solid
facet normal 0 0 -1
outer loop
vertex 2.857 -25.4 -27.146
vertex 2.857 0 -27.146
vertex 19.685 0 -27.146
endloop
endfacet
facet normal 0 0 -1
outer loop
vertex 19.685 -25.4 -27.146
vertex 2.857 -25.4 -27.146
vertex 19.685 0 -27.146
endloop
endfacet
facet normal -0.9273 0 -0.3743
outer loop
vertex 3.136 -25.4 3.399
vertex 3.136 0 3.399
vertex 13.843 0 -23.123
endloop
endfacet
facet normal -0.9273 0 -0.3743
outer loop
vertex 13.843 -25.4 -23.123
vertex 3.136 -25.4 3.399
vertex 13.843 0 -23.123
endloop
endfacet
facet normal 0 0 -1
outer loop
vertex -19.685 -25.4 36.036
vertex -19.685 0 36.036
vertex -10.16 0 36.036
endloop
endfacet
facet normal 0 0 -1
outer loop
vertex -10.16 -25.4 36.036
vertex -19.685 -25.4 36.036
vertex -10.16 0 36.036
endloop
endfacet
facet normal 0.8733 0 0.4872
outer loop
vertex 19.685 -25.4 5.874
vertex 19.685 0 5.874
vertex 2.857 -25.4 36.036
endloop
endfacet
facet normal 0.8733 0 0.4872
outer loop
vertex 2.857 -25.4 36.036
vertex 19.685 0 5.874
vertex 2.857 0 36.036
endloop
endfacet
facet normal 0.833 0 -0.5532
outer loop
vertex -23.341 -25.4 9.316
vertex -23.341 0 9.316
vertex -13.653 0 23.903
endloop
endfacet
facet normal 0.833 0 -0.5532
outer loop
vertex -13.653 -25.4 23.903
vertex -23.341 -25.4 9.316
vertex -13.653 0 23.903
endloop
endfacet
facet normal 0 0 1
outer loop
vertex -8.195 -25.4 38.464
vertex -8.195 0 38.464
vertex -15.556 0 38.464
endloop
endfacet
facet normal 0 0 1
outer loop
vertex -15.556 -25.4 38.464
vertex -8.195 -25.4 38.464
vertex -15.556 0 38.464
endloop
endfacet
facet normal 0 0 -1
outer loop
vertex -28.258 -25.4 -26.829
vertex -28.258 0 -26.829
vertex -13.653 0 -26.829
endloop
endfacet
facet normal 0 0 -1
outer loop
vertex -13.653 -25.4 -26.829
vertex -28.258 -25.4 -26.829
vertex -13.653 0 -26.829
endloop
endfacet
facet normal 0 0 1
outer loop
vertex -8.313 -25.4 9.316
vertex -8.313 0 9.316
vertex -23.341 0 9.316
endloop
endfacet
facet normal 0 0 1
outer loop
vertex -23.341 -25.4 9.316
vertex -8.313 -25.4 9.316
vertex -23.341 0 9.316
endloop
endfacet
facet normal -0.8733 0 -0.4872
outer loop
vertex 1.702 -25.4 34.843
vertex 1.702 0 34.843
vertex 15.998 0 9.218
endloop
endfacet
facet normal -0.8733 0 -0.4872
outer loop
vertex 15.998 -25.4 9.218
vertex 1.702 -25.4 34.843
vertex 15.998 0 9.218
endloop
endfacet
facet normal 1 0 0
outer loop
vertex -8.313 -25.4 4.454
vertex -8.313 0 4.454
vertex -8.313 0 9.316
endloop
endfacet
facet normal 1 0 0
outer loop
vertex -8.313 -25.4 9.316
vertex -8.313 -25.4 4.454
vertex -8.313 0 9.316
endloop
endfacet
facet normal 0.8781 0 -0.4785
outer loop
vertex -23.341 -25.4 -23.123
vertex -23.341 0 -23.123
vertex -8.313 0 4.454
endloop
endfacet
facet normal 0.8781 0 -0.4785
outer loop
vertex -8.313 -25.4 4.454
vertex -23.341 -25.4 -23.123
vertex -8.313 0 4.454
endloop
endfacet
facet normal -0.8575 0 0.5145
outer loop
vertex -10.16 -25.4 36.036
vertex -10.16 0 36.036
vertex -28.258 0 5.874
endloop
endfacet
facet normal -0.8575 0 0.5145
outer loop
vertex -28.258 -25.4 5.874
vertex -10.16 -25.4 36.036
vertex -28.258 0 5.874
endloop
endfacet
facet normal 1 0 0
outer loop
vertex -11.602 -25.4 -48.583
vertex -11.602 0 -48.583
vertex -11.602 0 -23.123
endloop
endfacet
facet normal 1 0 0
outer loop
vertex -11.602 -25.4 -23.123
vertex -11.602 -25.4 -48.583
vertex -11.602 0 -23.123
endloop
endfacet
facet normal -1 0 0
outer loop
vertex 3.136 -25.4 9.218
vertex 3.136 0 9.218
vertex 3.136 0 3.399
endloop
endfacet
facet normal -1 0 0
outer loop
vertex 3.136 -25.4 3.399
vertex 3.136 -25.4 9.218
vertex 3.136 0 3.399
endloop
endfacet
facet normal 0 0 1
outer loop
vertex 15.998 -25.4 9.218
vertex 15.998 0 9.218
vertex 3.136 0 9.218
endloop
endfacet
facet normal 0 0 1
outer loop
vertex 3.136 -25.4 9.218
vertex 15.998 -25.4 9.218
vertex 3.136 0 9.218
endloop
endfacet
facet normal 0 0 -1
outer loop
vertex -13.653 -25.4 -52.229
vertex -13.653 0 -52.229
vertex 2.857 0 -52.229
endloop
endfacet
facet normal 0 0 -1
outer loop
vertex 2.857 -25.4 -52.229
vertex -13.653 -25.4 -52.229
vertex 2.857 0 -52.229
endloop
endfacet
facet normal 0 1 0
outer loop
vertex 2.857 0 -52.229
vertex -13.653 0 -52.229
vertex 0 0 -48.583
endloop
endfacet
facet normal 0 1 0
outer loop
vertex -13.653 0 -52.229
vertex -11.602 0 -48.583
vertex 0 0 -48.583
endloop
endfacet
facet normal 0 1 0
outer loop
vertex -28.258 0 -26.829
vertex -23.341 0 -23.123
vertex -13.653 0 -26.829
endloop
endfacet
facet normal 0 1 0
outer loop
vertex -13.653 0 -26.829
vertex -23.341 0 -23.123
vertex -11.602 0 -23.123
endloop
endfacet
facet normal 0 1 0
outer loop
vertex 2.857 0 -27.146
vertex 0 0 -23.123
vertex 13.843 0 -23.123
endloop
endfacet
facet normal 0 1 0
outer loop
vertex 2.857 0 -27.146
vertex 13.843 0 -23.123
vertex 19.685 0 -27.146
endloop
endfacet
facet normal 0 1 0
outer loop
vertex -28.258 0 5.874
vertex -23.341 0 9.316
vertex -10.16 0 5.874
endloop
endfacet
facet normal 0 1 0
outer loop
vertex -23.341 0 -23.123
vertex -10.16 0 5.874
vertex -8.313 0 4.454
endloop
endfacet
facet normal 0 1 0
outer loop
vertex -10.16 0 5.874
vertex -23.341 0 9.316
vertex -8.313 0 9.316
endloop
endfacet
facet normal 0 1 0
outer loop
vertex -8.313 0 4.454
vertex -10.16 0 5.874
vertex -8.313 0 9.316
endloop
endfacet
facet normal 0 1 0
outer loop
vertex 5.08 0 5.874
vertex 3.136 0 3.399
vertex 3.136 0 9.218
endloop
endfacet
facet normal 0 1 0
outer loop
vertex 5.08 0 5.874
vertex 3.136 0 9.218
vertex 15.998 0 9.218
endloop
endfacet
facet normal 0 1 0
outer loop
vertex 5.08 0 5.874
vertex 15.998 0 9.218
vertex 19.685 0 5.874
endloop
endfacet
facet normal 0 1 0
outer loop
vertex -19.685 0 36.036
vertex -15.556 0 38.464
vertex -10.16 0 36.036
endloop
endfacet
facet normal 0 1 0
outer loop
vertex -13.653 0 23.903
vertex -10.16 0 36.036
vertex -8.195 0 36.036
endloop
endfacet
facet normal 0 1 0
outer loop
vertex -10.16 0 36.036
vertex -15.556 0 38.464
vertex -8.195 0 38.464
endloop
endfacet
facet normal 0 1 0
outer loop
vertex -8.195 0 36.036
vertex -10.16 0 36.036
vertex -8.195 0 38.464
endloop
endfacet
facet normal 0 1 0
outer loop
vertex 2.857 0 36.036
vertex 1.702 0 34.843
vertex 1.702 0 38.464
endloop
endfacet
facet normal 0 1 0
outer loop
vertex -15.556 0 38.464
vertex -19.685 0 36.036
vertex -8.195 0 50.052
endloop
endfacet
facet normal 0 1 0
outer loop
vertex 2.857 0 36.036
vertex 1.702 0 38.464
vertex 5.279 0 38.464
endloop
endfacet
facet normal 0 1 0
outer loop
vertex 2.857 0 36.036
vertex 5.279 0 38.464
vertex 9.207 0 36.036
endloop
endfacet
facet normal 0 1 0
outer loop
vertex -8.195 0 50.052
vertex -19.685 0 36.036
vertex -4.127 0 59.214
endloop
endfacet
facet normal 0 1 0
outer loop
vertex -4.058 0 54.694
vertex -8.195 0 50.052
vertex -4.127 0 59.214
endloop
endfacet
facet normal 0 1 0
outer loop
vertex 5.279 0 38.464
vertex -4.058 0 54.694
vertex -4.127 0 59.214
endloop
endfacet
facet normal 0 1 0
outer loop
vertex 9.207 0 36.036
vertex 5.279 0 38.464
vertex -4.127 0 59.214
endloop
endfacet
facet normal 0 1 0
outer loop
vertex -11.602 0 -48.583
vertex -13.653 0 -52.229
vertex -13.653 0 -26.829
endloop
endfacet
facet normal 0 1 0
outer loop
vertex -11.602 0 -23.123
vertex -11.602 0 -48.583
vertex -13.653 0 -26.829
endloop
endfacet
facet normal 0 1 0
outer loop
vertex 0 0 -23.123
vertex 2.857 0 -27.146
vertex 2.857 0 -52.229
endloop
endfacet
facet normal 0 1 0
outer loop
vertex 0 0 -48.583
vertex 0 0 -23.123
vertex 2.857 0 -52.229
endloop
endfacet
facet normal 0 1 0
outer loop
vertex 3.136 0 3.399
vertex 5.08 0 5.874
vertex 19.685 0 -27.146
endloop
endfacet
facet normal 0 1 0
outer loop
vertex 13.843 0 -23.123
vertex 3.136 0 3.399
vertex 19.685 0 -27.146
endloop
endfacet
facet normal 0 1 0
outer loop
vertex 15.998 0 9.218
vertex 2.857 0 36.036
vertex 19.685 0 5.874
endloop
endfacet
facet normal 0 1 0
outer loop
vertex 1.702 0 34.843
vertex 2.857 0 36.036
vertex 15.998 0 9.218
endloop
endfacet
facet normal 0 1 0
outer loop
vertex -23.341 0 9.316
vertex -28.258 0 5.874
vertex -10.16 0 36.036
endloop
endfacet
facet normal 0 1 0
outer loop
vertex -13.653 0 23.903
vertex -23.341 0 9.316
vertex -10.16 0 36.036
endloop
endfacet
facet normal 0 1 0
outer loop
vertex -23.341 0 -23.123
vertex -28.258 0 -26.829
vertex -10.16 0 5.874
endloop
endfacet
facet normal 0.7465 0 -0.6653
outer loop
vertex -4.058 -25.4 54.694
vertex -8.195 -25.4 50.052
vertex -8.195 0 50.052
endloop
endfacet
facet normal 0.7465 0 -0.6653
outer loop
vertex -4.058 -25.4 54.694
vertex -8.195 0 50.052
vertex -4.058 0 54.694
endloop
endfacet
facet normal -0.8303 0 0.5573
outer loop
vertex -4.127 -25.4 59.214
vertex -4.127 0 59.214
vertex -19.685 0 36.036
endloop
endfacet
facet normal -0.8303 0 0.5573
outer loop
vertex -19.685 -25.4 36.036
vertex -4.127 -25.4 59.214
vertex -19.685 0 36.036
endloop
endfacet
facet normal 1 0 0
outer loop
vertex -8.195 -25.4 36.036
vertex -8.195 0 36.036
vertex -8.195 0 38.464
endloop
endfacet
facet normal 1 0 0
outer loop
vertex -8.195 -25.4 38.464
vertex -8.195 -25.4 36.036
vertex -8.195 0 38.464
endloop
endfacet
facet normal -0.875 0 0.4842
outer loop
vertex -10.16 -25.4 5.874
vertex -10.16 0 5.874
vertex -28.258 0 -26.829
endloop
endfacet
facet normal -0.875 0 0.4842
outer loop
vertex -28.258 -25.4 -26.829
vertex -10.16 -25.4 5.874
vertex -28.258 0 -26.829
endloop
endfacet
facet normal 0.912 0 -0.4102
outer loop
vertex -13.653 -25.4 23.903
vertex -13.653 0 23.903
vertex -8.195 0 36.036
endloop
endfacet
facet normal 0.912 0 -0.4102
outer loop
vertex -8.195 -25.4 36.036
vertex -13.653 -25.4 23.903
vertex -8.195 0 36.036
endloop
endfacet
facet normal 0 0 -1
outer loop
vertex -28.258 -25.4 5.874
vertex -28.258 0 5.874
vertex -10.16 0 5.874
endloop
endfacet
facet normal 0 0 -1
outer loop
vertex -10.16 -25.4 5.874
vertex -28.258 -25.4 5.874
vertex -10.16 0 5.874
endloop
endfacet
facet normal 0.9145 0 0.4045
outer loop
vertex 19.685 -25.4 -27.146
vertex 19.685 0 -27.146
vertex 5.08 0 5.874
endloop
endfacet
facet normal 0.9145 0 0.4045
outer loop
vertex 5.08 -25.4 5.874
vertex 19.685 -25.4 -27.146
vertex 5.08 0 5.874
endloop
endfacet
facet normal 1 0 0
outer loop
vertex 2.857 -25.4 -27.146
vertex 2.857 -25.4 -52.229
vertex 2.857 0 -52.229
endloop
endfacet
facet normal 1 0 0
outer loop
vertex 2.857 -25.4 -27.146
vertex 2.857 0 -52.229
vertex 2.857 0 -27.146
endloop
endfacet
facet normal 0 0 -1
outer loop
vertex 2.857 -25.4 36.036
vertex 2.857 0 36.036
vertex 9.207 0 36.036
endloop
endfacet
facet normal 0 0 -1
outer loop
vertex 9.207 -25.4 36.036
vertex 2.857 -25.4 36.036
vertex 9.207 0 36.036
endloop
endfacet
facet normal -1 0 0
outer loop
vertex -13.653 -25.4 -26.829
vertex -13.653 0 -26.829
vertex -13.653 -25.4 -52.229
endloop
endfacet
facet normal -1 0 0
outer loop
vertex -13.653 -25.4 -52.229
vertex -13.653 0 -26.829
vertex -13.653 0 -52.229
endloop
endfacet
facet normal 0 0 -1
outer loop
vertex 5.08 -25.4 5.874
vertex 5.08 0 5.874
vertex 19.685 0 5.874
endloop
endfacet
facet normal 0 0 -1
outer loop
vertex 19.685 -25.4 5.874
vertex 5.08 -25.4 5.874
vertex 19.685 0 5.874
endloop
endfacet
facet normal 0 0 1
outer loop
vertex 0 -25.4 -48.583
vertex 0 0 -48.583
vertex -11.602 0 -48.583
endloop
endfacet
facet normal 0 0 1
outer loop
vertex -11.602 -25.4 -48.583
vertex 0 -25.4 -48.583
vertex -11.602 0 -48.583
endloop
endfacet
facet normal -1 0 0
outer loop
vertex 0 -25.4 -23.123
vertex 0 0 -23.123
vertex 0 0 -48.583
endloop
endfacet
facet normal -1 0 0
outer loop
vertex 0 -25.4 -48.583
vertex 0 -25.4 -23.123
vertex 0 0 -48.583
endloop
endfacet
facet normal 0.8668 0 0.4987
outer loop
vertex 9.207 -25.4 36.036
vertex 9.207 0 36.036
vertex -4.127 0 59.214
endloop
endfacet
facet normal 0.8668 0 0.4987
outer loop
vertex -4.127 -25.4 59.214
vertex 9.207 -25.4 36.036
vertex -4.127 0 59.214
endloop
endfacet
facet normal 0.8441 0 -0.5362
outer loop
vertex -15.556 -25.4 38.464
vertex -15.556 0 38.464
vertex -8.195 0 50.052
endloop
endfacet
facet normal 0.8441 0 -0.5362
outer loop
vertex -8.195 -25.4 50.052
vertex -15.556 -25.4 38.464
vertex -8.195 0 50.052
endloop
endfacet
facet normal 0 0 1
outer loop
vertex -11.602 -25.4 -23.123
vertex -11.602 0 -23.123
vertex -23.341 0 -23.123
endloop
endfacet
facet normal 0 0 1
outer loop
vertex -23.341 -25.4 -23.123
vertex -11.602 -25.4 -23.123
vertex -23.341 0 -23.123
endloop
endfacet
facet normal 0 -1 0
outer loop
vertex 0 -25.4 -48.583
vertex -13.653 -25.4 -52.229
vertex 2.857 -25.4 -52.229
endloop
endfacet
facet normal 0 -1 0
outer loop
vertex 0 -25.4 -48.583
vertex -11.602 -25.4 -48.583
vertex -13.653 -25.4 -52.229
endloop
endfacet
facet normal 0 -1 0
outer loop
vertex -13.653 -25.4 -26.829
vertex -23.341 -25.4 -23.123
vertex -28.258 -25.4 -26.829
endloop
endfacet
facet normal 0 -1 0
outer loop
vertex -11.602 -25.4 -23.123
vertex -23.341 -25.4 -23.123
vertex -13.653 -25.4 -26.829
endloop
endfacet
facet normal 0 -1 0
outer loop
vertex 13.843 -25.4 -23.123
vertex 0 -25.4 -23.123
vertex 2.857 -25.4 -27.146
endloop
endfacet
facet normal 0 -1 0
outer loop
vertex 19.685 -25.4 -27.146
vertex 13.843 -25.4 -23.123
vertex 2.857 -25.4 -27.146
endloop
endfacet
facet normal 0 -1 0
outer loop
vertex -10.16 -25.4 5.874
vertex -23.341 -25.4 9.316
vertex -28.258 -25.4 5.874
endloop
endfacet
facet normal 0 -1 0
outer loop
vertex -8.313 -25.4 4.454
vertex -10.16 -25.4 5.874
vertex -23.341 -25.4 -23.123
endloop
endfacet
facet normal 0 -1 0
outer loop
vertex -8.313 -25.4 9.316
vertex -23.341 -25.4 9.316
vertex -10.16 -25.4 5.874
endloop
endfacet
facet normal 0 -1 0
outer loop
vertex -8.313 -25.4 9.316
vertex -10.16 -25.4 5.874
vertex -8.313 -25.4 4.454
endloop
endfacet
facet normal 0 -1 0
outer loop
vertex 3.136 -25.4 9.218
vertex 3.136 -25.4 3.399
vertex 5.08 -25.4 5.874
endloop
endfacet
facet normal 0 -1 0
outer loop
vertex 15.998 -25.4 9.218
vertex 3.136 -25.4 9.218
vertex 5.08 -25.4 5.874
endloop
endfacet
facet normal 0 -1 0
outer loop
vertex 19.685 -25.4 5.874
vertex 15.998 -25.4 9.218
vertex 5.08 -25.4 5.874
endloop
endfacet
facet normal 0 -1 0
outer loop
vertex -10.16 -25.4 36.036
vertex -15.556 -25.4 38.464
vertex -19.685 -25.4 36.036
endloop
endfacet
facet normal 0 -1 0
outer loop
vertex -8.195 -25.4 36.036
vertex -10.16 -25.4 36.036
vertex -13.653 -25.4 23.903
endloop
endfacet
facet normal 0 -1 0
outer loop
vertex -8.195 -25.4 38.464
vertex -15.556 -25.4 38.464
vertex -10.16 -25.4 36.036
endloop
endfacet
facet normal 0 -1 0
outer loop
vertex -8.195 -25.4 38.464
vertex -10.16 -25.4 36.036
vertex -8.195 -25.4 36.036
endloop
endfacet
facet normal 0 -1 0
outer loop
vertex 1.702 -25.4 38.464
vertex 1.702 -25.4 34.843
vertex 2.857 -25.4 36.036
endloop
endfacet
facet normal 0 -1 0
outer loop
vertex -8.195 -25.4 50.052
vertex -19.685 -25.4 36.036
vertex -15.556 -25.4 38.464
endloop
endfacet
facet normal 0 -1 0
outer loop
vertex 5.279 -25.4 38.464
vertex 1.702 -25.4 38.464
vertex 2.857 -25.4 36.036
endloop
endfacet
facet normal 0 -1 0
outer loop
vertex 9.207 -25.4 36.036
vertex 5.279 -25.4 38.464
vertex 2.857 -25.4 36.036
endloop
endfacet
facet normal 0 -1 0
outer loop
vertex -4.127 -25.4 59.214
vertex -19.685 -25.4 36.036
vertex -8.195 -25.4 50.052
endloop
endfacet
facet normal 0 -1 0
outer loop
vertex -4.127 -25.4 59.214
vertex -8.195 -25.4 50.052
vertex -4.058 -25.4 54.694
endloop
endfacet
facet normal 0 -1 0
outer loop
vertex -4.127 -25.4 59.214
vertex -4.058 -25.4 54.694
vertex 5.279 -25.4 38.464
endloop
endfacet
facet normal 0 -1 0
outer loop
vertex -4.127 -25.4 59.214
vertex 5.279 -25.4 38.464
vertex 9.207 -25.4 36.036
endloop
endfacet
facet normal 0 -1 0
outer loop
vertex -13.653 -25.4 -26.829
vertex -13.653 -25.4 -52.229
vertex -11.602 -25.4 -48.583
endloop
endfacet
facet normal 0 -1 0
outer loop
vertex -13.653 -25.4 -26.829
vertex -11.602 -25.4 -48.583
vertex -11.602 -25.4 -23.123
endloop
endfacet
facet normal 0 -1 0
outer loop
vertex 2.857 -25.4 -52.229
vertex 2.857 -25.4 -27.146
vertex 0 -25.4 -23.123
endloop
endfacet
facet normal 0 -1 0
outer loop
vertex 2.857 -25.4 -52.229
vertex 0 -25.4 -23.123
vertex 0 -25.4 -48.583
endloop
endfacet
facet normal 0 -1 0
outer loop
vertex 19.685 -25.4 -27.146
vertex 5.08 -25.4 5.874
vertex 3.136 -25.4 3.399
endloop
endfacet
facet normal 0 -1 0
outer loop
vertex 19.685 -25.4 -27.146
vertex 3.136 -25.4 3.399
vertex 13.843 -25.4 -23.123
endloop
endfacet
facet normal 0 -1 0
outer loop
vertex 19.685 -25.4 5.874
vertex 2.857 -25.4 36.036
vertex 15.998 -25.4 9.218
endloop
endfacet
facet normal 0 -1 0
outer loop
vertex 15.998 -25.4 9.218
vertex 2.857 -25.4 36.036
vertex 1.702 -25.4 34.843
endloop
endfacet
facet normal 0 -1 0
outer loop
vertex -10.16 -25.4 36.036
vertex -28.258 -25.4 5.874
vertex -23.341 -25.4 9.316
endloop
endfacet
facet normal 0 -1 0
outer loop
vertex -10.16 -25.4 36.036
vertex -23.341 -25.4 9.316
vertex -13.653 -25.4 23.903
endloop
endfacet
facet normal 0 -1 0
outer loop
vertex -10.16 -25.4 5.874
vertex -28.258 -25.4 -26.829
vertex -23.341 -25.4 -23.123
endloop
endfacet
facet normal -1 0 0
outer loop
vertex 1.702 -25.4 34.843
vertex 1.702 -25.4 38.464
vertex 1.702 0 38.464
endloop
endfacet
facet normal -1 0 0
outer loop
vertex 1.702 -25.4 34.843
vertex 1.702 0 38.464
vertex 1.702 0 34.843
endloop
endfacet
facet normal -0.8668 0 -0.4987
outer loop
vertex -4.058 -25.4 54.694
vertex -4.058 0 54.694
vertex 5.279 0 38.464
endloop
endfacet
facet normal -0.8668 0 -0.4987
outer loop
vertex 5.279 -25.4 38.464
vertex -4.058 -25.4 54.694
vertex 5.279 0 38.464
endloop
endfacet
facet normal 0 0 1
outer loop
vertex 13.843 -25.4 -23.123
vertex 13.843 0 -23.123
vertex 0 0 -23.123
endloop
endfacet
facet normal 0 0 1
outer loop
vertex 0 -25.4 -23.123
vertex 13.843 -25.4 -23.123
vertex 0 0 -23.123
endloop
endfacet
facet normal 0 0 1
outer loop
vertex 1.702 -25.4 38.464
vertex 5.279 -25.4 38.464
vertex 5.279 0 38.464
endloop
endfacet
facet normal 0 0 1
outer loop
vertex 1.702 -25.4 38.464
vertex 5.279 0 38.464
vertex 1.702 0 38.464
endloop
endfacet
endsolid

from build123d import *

# Parameters (mm, degrees)
F1_DEPTH = 25.4


with BuildPart() as f1:
    # F0 (on Front) → F1 (new body)
    with BuildSketch(Plane.XZ):
        Polygon((-28.2575, -26.828751), (-13.652501, -26.828751), (-13.652501, -52.228753), (2.857499, -52.228753), (2.857499, -27.14625), (19.684996, -27.14625), (5.08, 5.87375), (19.684996, 5.87375), (2.857499, 36.036253), (9.207499, 36.036253), (-4.127499, 59.21375), (-19.685, 36.036253), (-10.16, 36.036253), (-28.2575, 5.87375), (-10.16, 5.87375), align=None)
        Polygon((-23.341425, 9.316429), (-13.652501, 23.902772), (-8.195201, 36.036253), (-8.195201, 38.463868), (-15.555656, 38.463868), (-8.195201, 50.051615), (-4.058297, 54.693776), (5.279458, 38.463868), (1.701662, 38.463868), (1.701662, 34.84314), (15.997937, 9.217735), (3.135762, 9.217735), (3.135762, 3.399133), (13.842684, -23.123091), (0, -23.123091), (0, -48.583038), (-11.602138, -48.583038), (-11.602138, -23.123091), (-23.341425, -23.123091), (-8.313072, 4.454316), (-8.313072, 9.316429), align=None, mode=Mode.SUBTRACT)
    extrude(amount=F1_DEPTH)


solid = f1.part
